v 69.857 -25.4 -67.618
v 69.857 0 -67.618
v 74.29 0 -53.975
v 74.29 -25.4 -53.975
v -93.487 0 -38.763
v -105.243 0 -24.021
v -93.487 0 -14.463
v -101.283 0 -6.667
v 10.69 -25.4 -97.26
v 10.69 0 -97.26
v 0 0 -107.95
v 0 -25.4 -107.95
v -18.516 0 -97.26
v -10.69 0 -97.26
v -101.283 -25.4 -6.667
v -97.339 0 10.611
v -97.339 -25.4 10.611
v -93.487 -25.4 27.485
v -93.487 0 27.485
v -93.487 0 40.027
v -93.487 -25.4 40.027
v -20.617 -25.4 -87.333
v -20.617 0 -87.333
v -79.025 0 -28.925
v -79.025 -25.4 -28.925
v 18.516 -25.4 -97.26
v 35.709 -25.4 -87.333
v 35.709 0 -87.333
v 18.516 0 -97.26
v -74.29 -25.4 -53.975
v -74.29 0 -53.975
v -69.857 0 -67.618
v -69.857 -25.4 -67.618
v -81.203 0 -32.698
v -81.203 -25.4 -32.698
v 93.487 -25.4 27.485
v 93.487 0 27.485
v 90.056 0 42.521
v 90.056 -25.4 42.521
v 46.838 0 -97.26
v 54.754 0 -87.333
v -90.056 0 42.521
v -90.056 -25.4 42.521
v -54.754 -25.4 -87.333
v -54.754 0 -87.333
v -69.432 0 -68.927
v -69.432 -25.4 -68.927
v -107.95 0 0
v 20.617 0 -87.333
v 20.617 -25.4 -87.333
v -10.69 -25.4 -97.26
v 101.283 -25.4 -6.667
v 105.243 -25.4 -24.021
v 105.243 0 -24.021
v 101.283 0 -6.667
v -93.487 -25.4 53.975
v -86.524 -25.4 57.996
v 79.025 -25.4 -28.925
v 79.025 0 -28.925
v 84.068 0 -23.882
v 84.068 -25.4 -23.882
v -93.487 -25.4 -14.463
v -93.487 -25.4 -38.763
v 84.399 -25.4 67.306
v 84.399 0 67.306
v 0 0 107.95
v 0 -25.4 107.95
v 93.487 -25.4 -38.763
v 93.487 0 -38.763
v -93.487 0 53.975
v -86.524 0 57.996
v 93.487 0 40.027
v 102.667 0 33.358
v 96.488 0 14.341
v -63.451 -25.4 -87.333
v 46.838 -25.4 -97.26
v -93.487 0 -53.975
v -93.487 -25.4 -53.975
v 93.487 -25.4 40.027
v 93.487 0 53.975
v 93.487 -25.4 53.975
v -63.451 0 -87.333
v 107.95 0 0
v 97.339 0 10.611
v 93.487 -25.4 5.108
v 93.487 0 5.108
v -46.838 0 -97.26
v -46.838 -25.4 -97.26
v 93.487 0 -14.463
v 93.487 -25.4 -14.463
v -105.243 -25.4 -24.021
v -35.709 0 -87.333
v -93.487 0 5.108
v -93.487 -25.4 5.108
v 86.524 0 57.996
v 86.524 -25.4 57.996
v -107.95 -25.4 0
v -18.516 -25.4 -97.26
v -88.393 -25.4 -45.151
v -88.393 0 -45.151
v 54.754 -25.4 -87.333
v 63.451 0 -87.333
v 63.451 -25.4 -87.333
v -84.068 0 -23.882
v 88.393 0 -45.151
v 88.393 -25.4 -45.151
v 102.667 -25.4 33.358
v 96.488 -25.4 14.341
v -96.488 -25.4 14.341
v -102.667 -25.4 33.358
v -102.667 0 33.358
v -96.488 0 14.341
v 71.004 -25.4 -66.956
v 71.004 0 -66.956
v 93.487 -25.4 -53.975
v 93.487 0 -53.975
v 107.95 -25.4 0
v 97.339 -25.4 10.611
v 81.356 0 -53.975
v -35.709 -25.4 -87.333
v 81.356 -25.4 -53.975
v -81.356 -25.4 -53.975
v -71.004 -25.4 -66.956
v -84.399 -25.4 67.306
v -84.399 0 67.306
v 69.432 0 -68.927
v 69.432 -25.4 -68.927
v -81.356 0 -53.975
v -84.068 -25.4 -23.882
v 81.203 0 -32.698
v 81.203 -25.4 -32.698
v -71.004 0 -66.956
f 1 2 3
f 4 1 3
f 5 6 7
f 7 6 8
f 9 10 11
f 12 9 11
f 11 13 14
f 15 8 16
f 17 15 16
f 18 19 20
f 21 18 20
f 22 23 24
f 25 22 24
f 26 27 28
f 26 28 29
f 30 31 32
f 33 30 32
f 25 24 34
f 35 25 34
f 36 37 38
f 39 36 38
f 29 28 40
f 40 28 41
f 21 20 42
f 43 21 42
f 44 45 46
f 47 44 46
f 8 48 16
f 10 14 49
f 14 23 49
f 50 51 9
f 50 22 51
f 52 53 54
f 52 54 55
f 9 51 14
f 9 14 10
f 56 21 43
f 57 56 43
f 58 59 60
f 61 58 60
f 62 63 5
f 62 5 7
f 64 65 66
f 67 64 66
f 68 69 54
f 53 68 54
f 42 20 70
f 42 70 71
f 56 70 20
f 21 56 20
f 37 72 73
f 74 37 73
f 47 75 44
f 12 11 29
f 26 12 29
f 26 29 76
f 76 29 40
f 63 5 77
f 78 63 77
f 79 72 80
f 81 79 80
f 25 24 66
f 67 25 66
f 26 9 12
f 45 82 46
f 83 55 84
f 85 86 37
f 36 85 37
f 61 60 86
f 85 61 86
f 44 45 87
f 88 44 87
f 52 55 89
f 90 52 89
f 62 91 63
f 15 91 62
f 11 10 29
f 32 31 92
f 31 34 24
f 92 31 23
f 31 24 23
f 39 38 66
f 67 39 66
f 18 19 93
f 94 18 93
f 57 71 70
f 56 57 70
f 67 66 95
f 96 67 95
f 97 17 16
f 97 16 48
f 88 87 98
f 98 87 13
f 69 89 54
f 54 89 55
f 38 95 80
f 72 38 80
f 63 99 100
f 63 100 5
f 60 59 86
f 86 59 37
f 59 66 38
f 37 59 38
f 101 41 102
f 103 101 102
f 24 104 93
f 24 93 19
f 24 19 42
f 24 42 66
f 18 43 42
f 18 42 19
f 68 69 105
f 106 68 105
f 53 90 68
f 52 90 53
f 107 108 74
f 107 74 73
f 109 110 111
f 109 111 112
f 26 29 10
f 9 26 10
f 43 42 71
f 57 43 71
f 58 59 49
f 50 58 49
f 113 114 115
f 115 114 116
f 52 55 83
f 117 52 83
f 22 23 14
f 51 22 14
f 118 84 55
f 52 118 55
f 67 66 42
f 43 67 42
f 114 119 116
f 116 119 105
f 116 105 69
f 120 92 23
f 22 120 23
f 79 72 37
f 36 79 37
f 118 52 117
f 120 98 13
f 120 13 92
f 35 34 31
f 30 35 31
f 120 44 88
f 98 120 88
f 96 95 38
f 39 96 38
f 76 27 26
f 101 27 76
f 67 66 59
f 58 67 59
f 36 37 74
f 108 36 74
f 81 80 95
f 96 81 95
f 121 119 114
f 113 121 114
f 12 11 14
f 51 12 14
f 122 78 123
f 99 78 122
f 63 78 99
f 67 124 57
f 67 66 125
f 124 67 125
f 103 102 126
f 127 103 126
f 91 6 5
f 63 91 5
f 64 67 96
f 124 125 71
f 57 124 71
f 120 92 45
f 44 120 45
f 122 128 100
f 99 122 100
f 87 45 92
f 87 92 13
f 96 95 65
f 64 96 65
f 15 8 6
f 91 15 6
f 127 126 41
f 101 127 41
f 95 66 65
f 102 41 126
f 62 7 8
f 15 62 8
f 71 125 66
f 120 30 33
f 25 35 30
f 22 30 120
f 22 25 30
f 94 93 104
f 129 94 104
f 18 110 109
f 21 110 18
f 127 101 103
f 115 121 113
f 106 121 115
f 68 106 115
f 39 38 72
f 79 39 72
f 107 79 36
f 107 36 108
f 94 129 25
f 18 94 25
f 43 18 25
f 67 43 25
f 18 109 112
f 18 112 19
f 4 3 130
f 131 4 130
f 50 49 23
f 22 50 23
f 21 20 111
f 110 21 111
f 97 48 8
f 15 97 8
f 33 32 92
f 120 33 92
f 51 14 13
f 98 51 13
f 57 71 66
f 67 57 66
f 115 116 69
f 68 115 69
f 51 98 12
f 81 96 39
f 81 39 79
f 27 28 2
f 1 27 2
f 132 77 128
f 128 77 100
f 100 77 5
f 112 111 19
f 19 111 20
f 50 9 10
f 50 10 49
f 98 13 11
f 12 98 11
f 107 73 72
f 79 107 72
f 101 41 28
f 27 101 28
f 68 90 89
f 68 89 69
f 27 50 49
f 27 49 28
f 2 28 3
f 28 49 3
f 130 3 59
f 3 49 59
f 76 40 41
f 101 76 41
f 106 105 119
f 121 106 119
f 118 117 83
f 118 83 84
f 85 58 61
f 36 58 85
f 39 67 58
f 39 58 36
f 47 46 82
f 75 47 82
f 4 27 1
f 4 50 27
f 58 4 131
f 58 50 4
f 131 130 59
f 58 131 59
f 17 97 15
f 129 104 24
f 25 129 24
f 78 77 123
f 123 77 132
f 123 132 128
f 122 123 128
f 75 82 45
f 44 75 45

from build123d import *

# Parameters (mm, degrees)
F1_DEPTH = 25.4


with BuildPart() as f1:
    # F0 (on Front) → F1 (new body)
    with BuildSketch(Plane.XZ):
        Polygon((86.5237025398, 57.9955170473), (84.3987085324, 67.3057241107), (0, 107.95), align=None)
    extrude(amount=F1_DEPTH)


with BuildPart() as f1b:
    # F0 (on Front) → F1, piece 2 (new body)
    with BuildSketch(Plane.XZ):
        Polygon((101.2825929907, -6.6674070093), (107.95, 0), (97.3388825316, 10.6111174684), align=None)
    extrude(amount=F1_DEPTH)


with BuildPart() as f1c:
    # F0 (on Front) → F1, piece 3 (new body)
    with BuildSketch(Plane.XZ):
        Polygon((88.3929284935, -45.1510431805), (93.4874423385, -53.975), (93.4874423385, -38.7627248791), align=None)
        Polygon((81.3560577453, -53.975), (93.4874423385, -53.975), (88.3929284935, -45.1510431805), align=None)
        Polygon((71.0043670346, -66.9556095789), (93.4874423385, -53.975), (81.3560577453, -53.975), align=None)
    extrude(amount=F1_DEPTH)


with BuildPart() as f1d:
    # F0 (on Front) → F1, piece 4 (new body)
    with BuildSketch(Plane.XZ):
        Polygon((54.7536337763, -87.3333845428), (63.451417985, -87.3333845428), (69.4318630581, -68.9274671963), align=None)
    extrude(amount=F1_DEPTH)


with BuildPart() as f1e:
    # F0 (on Front) → F1, piece 5 (new body)
    with BuildSketch(Plane.XZ):
        Polygon((10.6904107099, -97.2595892901), (0, -107.95), (18.5163345034, -97.2595892901), align=None)
    extrude(amount=F1_DEPTH)


with BuildPart() as f1f:
    # F0 (on Front) → F1, piece 6 (new body)
    with BuildSketch(Plane.XZ):
        Polygon((-18.5163345034, -97.2595892901), (0, -107.95), (-10.6904107099, -97.2595892901), align=None)
    extrude(amount=F1_DEPTH)


with BuildPart() as f1g:
    # F0 (on Front) → F1, piece 7 (new body)
    with BuildSketch(Plane.XZ):
        Polygon((-69.4318630581, -68.9274671963), (-63.451417985, -87.3333845428), (-54.7536337763, -87.3333845428), align=None)
    extrude(amount=F1_DEPTH)


with BuildPart() as f1h:
    # F0 (on Front) → F1, piece 8 (new body)
    with BuildSketch(Plane.XZ):
        Polygon((-71.0043670346, -66.9556095789), (-81.3560577453, -53.975), (-93.4874423385, -53.975), align=None)
        Polygon((-81.3560577453, -53.975), (-88.3929284935, -45.1510431805), (-93.4874423385, -53.975), align=None)
        Polygon((-93.4874423385, -53.975), (-88.3929284935, -45.1510431805), (-93.4874423385, -38.7627248791), align=None)
    extrude(amount=F1_DEPTH)


with BuildPart() as f1i:
    # F0 (on Front) → F1, piece 9 (new body)
    with BuildSketch(Plane.XZ):
        Polygon((-101.2825929907, -6.6674070093), (-97.3388825316, 10.6111174684), (-107.95, 0), align=None)
    extrude(amount=F1_DEPTH)


with BuildPart() as f1j:
    # F0 (on Front) → F1, piece 10 (new body)
    with BuildSketch(Plane.XZ):
        Polygon((-86.5237025398, 57.9955170473), (0, 107.95), (-84.3987085324, 67.3057241107), align=None)
    extrude(amount=F1_DEPTH)


with BuildPart() as f1k:
    # F0 (on Front) → F1, piece 11 (new body)
    with BuildSketch(Plane.XZ):
        Polygon((93.4874423385, 40.0273973066), (93.4874423385, 53.975), (86.5237025398, 57.9955170473), (90.0557331124, 42.5206800031), align=None)
    extrude(amount=F1_DEPTH)


with BuildPart() as f1l:
    # F0 (on Front) → F1, piece 12 (new body)
    with BuildSketch(Plane.XZ):
        Polygon((93.4874423385, 14.4625576615), (93.4874423385, 27.4853794967), (90.0557331124, 42.5206800031), (0, 107.95), align=None)
        Polygon((84.0680334422, -23.8819665578), (93.4874423385, 5.1079931324), (93.4874423385, 14.4625576615), (0, 107.95), (79.0248846771, -28.9251153229), align=None)
    extrude(amount=F1_DEPTH)


with BuildPart() as f1m:
    # F0 (on Front) → F1, piece 13 (new body)
    with BuildSketch(Plane.XZ):
        Polygon((96.4875062817, 14.3412405407), (102.6665509341, 33.3583845428), (93.4874423385, 40.0273973066), (93.4874423385, 27.4853794967), align=None)
    extrude(amount=F1_DEPTH)


with BuildPart() as f1n:
    # F0 (on Front) → F1, piece 14 (new body)
    with BuildSketch(Plane.XZ):
        Polygon((93.4874423385, -38.7627248791), (105.24346812, -24.0211348206), (101.2825929907, -6.6674070093), (93.4874423385, -14.4625576615), align=None)
    extrude(amount=F1_DEPTH)


with BuildPart() as f1o:
    # F0 (on Front) → F1, piece 15 (new body)
    with BuildSketch(Plane.XZ):
        Polygon((18.5163345034, -97.2595892901), (46.8377496377, -97.2595892901), (54.7536337763, -87.3333845428), (35.709025452, -87.3333845428), align=None)
    extrude(amount=F1_DEPTH)


with BuildPart() as f1p:
    # F0 (on Front) → F1, piece 16 (new body)
    with BuildSketch(Plane.XZ):
        Polygon((-54.7536337763, -87.3333845428), (-46.8377496377, -97.2595892901), (-18.5163345034, -97.2595892901), (-35.709025452, -87.3333845428), align=None)
    extrude(amount=F1_DEPTH)


with BuildPart() as f1q:
    # F0 (on Front) → F1, piece 17 (new body)
    with BuildSketch(Plane.XZ):
        Polygon((-93.4874423385, -38.7627248791), (-93.4874423385, -14.4625576615), (-101.2825929907, -6.6674070093), (-105.24346812, -24.0211348206), align=None)
    extrude(amount=F1_DEPTH)


with BuildPart() as f1r:
    # F0 (on Front) → F1, piece 18 (new body)
    with BuildSketch(Plane.XZ):
        Polygon((-96.4875062817, 14.3412405407), (-93.4874423385, 27.4853794967), (-93.4874423385, 40.0273973066), (-102.6665509341, 33.3583845428), align=None)
    extrude(amount=F1_DEPTH)


with BuildPart() as f1s:
    # F0 (on Front) → F1, piece 19 (new body)
    with BuildSketch(Plane.XZ):
        Polygon((-93.4874423385, 14.4625576615), (0, 107.95), (-90.0557331124, 42.5206800031), (-93.4874423385, 27.4853794967), align=None)
        Polygon((-79.0248846771, -28.9251153229), (0, 107.95), (-93.4874423385, 14.4625576615), (-93.4874423385, 5.1079931324), (-84.0680334422, -23.8819665578), align=None)
    extrude(amount=F1_DEPTH)


with BuildPart() as f1t:
    # F0 (on Front) → F1, piece 20 (new body)
    with BuildSketch(Plane.XZ):
        Polygon((-90.0557331124, 42.5206800031), (-86.5237025398, 57.9955170473), (-93.4874423385, 53.975), (-93.4874423385, 40.0273973066), align=None)
    extrude(amount=F1_DEPTH)


with BuildPart() as f1u:
    # F0 (on Front) → F1, piece 21 (new body)
    with BuildSketch(Plane.XZ):
        Polygon((-53.975, -53.975), (-79.0248846771, -28.9251153229), (-81.2033973378, -32.6984099363), (-74.2902141574, -53.975), align=None)
        Polygon((-20.6166154572, -87.3333845428), (-53.975, -53.975), (-74.2902141574, -53.975), (-69.8573951409, -67.6178141105), (-35.709025452, -87.3333845428), align=None)
    extrude(amount=F1_DEPTH)


with BuildPart() as f1v:
    # F0 (on Front) → F1, piece 22 (new body)
    with BuildSketch(Plane.XZ):
        Polygon((35.709025452, -87.3333845428), (69.8573951409, -67.6178141105), (74.2902141574, -53.975), (53.975, -53.975), (20.6166154572, -87.3333845428), align=None)
        Polygon((74.2902141574, -53.975), (81.2033973378, -32.6984099363), (79.0248846771, -28.9251153229), (53.975, -53.975), align=None)
    extrude(amount=F1_DEPTH)


with BuildPart() as f1w:
    # F0 (on Front) → F1, piece 23 (new body)
    with BuildSketch(Plane.XZ):
        Polygon((-10.6904107099, -97.2595892901), (10.6904107099, -97.2595892901), (20.6166154572, -87.3333845428), (-20.6166154572, -87.3333845428), align=None)
    extrude(amount=F1_DEPTH)


solid = Compound([f1.part, f1b.part, f1c.part, f1d.part, f1e.part, f1f.part, f1g.part, f1h.part, f1i.part, f1j.part, f1k.part, f1l.part, f1m.part, f1n.part, f1o.part, f1p.part, f1q.part, f1r.part, f1s.part, f1t.part, f1u.part, f1v.part, f1w.part])
